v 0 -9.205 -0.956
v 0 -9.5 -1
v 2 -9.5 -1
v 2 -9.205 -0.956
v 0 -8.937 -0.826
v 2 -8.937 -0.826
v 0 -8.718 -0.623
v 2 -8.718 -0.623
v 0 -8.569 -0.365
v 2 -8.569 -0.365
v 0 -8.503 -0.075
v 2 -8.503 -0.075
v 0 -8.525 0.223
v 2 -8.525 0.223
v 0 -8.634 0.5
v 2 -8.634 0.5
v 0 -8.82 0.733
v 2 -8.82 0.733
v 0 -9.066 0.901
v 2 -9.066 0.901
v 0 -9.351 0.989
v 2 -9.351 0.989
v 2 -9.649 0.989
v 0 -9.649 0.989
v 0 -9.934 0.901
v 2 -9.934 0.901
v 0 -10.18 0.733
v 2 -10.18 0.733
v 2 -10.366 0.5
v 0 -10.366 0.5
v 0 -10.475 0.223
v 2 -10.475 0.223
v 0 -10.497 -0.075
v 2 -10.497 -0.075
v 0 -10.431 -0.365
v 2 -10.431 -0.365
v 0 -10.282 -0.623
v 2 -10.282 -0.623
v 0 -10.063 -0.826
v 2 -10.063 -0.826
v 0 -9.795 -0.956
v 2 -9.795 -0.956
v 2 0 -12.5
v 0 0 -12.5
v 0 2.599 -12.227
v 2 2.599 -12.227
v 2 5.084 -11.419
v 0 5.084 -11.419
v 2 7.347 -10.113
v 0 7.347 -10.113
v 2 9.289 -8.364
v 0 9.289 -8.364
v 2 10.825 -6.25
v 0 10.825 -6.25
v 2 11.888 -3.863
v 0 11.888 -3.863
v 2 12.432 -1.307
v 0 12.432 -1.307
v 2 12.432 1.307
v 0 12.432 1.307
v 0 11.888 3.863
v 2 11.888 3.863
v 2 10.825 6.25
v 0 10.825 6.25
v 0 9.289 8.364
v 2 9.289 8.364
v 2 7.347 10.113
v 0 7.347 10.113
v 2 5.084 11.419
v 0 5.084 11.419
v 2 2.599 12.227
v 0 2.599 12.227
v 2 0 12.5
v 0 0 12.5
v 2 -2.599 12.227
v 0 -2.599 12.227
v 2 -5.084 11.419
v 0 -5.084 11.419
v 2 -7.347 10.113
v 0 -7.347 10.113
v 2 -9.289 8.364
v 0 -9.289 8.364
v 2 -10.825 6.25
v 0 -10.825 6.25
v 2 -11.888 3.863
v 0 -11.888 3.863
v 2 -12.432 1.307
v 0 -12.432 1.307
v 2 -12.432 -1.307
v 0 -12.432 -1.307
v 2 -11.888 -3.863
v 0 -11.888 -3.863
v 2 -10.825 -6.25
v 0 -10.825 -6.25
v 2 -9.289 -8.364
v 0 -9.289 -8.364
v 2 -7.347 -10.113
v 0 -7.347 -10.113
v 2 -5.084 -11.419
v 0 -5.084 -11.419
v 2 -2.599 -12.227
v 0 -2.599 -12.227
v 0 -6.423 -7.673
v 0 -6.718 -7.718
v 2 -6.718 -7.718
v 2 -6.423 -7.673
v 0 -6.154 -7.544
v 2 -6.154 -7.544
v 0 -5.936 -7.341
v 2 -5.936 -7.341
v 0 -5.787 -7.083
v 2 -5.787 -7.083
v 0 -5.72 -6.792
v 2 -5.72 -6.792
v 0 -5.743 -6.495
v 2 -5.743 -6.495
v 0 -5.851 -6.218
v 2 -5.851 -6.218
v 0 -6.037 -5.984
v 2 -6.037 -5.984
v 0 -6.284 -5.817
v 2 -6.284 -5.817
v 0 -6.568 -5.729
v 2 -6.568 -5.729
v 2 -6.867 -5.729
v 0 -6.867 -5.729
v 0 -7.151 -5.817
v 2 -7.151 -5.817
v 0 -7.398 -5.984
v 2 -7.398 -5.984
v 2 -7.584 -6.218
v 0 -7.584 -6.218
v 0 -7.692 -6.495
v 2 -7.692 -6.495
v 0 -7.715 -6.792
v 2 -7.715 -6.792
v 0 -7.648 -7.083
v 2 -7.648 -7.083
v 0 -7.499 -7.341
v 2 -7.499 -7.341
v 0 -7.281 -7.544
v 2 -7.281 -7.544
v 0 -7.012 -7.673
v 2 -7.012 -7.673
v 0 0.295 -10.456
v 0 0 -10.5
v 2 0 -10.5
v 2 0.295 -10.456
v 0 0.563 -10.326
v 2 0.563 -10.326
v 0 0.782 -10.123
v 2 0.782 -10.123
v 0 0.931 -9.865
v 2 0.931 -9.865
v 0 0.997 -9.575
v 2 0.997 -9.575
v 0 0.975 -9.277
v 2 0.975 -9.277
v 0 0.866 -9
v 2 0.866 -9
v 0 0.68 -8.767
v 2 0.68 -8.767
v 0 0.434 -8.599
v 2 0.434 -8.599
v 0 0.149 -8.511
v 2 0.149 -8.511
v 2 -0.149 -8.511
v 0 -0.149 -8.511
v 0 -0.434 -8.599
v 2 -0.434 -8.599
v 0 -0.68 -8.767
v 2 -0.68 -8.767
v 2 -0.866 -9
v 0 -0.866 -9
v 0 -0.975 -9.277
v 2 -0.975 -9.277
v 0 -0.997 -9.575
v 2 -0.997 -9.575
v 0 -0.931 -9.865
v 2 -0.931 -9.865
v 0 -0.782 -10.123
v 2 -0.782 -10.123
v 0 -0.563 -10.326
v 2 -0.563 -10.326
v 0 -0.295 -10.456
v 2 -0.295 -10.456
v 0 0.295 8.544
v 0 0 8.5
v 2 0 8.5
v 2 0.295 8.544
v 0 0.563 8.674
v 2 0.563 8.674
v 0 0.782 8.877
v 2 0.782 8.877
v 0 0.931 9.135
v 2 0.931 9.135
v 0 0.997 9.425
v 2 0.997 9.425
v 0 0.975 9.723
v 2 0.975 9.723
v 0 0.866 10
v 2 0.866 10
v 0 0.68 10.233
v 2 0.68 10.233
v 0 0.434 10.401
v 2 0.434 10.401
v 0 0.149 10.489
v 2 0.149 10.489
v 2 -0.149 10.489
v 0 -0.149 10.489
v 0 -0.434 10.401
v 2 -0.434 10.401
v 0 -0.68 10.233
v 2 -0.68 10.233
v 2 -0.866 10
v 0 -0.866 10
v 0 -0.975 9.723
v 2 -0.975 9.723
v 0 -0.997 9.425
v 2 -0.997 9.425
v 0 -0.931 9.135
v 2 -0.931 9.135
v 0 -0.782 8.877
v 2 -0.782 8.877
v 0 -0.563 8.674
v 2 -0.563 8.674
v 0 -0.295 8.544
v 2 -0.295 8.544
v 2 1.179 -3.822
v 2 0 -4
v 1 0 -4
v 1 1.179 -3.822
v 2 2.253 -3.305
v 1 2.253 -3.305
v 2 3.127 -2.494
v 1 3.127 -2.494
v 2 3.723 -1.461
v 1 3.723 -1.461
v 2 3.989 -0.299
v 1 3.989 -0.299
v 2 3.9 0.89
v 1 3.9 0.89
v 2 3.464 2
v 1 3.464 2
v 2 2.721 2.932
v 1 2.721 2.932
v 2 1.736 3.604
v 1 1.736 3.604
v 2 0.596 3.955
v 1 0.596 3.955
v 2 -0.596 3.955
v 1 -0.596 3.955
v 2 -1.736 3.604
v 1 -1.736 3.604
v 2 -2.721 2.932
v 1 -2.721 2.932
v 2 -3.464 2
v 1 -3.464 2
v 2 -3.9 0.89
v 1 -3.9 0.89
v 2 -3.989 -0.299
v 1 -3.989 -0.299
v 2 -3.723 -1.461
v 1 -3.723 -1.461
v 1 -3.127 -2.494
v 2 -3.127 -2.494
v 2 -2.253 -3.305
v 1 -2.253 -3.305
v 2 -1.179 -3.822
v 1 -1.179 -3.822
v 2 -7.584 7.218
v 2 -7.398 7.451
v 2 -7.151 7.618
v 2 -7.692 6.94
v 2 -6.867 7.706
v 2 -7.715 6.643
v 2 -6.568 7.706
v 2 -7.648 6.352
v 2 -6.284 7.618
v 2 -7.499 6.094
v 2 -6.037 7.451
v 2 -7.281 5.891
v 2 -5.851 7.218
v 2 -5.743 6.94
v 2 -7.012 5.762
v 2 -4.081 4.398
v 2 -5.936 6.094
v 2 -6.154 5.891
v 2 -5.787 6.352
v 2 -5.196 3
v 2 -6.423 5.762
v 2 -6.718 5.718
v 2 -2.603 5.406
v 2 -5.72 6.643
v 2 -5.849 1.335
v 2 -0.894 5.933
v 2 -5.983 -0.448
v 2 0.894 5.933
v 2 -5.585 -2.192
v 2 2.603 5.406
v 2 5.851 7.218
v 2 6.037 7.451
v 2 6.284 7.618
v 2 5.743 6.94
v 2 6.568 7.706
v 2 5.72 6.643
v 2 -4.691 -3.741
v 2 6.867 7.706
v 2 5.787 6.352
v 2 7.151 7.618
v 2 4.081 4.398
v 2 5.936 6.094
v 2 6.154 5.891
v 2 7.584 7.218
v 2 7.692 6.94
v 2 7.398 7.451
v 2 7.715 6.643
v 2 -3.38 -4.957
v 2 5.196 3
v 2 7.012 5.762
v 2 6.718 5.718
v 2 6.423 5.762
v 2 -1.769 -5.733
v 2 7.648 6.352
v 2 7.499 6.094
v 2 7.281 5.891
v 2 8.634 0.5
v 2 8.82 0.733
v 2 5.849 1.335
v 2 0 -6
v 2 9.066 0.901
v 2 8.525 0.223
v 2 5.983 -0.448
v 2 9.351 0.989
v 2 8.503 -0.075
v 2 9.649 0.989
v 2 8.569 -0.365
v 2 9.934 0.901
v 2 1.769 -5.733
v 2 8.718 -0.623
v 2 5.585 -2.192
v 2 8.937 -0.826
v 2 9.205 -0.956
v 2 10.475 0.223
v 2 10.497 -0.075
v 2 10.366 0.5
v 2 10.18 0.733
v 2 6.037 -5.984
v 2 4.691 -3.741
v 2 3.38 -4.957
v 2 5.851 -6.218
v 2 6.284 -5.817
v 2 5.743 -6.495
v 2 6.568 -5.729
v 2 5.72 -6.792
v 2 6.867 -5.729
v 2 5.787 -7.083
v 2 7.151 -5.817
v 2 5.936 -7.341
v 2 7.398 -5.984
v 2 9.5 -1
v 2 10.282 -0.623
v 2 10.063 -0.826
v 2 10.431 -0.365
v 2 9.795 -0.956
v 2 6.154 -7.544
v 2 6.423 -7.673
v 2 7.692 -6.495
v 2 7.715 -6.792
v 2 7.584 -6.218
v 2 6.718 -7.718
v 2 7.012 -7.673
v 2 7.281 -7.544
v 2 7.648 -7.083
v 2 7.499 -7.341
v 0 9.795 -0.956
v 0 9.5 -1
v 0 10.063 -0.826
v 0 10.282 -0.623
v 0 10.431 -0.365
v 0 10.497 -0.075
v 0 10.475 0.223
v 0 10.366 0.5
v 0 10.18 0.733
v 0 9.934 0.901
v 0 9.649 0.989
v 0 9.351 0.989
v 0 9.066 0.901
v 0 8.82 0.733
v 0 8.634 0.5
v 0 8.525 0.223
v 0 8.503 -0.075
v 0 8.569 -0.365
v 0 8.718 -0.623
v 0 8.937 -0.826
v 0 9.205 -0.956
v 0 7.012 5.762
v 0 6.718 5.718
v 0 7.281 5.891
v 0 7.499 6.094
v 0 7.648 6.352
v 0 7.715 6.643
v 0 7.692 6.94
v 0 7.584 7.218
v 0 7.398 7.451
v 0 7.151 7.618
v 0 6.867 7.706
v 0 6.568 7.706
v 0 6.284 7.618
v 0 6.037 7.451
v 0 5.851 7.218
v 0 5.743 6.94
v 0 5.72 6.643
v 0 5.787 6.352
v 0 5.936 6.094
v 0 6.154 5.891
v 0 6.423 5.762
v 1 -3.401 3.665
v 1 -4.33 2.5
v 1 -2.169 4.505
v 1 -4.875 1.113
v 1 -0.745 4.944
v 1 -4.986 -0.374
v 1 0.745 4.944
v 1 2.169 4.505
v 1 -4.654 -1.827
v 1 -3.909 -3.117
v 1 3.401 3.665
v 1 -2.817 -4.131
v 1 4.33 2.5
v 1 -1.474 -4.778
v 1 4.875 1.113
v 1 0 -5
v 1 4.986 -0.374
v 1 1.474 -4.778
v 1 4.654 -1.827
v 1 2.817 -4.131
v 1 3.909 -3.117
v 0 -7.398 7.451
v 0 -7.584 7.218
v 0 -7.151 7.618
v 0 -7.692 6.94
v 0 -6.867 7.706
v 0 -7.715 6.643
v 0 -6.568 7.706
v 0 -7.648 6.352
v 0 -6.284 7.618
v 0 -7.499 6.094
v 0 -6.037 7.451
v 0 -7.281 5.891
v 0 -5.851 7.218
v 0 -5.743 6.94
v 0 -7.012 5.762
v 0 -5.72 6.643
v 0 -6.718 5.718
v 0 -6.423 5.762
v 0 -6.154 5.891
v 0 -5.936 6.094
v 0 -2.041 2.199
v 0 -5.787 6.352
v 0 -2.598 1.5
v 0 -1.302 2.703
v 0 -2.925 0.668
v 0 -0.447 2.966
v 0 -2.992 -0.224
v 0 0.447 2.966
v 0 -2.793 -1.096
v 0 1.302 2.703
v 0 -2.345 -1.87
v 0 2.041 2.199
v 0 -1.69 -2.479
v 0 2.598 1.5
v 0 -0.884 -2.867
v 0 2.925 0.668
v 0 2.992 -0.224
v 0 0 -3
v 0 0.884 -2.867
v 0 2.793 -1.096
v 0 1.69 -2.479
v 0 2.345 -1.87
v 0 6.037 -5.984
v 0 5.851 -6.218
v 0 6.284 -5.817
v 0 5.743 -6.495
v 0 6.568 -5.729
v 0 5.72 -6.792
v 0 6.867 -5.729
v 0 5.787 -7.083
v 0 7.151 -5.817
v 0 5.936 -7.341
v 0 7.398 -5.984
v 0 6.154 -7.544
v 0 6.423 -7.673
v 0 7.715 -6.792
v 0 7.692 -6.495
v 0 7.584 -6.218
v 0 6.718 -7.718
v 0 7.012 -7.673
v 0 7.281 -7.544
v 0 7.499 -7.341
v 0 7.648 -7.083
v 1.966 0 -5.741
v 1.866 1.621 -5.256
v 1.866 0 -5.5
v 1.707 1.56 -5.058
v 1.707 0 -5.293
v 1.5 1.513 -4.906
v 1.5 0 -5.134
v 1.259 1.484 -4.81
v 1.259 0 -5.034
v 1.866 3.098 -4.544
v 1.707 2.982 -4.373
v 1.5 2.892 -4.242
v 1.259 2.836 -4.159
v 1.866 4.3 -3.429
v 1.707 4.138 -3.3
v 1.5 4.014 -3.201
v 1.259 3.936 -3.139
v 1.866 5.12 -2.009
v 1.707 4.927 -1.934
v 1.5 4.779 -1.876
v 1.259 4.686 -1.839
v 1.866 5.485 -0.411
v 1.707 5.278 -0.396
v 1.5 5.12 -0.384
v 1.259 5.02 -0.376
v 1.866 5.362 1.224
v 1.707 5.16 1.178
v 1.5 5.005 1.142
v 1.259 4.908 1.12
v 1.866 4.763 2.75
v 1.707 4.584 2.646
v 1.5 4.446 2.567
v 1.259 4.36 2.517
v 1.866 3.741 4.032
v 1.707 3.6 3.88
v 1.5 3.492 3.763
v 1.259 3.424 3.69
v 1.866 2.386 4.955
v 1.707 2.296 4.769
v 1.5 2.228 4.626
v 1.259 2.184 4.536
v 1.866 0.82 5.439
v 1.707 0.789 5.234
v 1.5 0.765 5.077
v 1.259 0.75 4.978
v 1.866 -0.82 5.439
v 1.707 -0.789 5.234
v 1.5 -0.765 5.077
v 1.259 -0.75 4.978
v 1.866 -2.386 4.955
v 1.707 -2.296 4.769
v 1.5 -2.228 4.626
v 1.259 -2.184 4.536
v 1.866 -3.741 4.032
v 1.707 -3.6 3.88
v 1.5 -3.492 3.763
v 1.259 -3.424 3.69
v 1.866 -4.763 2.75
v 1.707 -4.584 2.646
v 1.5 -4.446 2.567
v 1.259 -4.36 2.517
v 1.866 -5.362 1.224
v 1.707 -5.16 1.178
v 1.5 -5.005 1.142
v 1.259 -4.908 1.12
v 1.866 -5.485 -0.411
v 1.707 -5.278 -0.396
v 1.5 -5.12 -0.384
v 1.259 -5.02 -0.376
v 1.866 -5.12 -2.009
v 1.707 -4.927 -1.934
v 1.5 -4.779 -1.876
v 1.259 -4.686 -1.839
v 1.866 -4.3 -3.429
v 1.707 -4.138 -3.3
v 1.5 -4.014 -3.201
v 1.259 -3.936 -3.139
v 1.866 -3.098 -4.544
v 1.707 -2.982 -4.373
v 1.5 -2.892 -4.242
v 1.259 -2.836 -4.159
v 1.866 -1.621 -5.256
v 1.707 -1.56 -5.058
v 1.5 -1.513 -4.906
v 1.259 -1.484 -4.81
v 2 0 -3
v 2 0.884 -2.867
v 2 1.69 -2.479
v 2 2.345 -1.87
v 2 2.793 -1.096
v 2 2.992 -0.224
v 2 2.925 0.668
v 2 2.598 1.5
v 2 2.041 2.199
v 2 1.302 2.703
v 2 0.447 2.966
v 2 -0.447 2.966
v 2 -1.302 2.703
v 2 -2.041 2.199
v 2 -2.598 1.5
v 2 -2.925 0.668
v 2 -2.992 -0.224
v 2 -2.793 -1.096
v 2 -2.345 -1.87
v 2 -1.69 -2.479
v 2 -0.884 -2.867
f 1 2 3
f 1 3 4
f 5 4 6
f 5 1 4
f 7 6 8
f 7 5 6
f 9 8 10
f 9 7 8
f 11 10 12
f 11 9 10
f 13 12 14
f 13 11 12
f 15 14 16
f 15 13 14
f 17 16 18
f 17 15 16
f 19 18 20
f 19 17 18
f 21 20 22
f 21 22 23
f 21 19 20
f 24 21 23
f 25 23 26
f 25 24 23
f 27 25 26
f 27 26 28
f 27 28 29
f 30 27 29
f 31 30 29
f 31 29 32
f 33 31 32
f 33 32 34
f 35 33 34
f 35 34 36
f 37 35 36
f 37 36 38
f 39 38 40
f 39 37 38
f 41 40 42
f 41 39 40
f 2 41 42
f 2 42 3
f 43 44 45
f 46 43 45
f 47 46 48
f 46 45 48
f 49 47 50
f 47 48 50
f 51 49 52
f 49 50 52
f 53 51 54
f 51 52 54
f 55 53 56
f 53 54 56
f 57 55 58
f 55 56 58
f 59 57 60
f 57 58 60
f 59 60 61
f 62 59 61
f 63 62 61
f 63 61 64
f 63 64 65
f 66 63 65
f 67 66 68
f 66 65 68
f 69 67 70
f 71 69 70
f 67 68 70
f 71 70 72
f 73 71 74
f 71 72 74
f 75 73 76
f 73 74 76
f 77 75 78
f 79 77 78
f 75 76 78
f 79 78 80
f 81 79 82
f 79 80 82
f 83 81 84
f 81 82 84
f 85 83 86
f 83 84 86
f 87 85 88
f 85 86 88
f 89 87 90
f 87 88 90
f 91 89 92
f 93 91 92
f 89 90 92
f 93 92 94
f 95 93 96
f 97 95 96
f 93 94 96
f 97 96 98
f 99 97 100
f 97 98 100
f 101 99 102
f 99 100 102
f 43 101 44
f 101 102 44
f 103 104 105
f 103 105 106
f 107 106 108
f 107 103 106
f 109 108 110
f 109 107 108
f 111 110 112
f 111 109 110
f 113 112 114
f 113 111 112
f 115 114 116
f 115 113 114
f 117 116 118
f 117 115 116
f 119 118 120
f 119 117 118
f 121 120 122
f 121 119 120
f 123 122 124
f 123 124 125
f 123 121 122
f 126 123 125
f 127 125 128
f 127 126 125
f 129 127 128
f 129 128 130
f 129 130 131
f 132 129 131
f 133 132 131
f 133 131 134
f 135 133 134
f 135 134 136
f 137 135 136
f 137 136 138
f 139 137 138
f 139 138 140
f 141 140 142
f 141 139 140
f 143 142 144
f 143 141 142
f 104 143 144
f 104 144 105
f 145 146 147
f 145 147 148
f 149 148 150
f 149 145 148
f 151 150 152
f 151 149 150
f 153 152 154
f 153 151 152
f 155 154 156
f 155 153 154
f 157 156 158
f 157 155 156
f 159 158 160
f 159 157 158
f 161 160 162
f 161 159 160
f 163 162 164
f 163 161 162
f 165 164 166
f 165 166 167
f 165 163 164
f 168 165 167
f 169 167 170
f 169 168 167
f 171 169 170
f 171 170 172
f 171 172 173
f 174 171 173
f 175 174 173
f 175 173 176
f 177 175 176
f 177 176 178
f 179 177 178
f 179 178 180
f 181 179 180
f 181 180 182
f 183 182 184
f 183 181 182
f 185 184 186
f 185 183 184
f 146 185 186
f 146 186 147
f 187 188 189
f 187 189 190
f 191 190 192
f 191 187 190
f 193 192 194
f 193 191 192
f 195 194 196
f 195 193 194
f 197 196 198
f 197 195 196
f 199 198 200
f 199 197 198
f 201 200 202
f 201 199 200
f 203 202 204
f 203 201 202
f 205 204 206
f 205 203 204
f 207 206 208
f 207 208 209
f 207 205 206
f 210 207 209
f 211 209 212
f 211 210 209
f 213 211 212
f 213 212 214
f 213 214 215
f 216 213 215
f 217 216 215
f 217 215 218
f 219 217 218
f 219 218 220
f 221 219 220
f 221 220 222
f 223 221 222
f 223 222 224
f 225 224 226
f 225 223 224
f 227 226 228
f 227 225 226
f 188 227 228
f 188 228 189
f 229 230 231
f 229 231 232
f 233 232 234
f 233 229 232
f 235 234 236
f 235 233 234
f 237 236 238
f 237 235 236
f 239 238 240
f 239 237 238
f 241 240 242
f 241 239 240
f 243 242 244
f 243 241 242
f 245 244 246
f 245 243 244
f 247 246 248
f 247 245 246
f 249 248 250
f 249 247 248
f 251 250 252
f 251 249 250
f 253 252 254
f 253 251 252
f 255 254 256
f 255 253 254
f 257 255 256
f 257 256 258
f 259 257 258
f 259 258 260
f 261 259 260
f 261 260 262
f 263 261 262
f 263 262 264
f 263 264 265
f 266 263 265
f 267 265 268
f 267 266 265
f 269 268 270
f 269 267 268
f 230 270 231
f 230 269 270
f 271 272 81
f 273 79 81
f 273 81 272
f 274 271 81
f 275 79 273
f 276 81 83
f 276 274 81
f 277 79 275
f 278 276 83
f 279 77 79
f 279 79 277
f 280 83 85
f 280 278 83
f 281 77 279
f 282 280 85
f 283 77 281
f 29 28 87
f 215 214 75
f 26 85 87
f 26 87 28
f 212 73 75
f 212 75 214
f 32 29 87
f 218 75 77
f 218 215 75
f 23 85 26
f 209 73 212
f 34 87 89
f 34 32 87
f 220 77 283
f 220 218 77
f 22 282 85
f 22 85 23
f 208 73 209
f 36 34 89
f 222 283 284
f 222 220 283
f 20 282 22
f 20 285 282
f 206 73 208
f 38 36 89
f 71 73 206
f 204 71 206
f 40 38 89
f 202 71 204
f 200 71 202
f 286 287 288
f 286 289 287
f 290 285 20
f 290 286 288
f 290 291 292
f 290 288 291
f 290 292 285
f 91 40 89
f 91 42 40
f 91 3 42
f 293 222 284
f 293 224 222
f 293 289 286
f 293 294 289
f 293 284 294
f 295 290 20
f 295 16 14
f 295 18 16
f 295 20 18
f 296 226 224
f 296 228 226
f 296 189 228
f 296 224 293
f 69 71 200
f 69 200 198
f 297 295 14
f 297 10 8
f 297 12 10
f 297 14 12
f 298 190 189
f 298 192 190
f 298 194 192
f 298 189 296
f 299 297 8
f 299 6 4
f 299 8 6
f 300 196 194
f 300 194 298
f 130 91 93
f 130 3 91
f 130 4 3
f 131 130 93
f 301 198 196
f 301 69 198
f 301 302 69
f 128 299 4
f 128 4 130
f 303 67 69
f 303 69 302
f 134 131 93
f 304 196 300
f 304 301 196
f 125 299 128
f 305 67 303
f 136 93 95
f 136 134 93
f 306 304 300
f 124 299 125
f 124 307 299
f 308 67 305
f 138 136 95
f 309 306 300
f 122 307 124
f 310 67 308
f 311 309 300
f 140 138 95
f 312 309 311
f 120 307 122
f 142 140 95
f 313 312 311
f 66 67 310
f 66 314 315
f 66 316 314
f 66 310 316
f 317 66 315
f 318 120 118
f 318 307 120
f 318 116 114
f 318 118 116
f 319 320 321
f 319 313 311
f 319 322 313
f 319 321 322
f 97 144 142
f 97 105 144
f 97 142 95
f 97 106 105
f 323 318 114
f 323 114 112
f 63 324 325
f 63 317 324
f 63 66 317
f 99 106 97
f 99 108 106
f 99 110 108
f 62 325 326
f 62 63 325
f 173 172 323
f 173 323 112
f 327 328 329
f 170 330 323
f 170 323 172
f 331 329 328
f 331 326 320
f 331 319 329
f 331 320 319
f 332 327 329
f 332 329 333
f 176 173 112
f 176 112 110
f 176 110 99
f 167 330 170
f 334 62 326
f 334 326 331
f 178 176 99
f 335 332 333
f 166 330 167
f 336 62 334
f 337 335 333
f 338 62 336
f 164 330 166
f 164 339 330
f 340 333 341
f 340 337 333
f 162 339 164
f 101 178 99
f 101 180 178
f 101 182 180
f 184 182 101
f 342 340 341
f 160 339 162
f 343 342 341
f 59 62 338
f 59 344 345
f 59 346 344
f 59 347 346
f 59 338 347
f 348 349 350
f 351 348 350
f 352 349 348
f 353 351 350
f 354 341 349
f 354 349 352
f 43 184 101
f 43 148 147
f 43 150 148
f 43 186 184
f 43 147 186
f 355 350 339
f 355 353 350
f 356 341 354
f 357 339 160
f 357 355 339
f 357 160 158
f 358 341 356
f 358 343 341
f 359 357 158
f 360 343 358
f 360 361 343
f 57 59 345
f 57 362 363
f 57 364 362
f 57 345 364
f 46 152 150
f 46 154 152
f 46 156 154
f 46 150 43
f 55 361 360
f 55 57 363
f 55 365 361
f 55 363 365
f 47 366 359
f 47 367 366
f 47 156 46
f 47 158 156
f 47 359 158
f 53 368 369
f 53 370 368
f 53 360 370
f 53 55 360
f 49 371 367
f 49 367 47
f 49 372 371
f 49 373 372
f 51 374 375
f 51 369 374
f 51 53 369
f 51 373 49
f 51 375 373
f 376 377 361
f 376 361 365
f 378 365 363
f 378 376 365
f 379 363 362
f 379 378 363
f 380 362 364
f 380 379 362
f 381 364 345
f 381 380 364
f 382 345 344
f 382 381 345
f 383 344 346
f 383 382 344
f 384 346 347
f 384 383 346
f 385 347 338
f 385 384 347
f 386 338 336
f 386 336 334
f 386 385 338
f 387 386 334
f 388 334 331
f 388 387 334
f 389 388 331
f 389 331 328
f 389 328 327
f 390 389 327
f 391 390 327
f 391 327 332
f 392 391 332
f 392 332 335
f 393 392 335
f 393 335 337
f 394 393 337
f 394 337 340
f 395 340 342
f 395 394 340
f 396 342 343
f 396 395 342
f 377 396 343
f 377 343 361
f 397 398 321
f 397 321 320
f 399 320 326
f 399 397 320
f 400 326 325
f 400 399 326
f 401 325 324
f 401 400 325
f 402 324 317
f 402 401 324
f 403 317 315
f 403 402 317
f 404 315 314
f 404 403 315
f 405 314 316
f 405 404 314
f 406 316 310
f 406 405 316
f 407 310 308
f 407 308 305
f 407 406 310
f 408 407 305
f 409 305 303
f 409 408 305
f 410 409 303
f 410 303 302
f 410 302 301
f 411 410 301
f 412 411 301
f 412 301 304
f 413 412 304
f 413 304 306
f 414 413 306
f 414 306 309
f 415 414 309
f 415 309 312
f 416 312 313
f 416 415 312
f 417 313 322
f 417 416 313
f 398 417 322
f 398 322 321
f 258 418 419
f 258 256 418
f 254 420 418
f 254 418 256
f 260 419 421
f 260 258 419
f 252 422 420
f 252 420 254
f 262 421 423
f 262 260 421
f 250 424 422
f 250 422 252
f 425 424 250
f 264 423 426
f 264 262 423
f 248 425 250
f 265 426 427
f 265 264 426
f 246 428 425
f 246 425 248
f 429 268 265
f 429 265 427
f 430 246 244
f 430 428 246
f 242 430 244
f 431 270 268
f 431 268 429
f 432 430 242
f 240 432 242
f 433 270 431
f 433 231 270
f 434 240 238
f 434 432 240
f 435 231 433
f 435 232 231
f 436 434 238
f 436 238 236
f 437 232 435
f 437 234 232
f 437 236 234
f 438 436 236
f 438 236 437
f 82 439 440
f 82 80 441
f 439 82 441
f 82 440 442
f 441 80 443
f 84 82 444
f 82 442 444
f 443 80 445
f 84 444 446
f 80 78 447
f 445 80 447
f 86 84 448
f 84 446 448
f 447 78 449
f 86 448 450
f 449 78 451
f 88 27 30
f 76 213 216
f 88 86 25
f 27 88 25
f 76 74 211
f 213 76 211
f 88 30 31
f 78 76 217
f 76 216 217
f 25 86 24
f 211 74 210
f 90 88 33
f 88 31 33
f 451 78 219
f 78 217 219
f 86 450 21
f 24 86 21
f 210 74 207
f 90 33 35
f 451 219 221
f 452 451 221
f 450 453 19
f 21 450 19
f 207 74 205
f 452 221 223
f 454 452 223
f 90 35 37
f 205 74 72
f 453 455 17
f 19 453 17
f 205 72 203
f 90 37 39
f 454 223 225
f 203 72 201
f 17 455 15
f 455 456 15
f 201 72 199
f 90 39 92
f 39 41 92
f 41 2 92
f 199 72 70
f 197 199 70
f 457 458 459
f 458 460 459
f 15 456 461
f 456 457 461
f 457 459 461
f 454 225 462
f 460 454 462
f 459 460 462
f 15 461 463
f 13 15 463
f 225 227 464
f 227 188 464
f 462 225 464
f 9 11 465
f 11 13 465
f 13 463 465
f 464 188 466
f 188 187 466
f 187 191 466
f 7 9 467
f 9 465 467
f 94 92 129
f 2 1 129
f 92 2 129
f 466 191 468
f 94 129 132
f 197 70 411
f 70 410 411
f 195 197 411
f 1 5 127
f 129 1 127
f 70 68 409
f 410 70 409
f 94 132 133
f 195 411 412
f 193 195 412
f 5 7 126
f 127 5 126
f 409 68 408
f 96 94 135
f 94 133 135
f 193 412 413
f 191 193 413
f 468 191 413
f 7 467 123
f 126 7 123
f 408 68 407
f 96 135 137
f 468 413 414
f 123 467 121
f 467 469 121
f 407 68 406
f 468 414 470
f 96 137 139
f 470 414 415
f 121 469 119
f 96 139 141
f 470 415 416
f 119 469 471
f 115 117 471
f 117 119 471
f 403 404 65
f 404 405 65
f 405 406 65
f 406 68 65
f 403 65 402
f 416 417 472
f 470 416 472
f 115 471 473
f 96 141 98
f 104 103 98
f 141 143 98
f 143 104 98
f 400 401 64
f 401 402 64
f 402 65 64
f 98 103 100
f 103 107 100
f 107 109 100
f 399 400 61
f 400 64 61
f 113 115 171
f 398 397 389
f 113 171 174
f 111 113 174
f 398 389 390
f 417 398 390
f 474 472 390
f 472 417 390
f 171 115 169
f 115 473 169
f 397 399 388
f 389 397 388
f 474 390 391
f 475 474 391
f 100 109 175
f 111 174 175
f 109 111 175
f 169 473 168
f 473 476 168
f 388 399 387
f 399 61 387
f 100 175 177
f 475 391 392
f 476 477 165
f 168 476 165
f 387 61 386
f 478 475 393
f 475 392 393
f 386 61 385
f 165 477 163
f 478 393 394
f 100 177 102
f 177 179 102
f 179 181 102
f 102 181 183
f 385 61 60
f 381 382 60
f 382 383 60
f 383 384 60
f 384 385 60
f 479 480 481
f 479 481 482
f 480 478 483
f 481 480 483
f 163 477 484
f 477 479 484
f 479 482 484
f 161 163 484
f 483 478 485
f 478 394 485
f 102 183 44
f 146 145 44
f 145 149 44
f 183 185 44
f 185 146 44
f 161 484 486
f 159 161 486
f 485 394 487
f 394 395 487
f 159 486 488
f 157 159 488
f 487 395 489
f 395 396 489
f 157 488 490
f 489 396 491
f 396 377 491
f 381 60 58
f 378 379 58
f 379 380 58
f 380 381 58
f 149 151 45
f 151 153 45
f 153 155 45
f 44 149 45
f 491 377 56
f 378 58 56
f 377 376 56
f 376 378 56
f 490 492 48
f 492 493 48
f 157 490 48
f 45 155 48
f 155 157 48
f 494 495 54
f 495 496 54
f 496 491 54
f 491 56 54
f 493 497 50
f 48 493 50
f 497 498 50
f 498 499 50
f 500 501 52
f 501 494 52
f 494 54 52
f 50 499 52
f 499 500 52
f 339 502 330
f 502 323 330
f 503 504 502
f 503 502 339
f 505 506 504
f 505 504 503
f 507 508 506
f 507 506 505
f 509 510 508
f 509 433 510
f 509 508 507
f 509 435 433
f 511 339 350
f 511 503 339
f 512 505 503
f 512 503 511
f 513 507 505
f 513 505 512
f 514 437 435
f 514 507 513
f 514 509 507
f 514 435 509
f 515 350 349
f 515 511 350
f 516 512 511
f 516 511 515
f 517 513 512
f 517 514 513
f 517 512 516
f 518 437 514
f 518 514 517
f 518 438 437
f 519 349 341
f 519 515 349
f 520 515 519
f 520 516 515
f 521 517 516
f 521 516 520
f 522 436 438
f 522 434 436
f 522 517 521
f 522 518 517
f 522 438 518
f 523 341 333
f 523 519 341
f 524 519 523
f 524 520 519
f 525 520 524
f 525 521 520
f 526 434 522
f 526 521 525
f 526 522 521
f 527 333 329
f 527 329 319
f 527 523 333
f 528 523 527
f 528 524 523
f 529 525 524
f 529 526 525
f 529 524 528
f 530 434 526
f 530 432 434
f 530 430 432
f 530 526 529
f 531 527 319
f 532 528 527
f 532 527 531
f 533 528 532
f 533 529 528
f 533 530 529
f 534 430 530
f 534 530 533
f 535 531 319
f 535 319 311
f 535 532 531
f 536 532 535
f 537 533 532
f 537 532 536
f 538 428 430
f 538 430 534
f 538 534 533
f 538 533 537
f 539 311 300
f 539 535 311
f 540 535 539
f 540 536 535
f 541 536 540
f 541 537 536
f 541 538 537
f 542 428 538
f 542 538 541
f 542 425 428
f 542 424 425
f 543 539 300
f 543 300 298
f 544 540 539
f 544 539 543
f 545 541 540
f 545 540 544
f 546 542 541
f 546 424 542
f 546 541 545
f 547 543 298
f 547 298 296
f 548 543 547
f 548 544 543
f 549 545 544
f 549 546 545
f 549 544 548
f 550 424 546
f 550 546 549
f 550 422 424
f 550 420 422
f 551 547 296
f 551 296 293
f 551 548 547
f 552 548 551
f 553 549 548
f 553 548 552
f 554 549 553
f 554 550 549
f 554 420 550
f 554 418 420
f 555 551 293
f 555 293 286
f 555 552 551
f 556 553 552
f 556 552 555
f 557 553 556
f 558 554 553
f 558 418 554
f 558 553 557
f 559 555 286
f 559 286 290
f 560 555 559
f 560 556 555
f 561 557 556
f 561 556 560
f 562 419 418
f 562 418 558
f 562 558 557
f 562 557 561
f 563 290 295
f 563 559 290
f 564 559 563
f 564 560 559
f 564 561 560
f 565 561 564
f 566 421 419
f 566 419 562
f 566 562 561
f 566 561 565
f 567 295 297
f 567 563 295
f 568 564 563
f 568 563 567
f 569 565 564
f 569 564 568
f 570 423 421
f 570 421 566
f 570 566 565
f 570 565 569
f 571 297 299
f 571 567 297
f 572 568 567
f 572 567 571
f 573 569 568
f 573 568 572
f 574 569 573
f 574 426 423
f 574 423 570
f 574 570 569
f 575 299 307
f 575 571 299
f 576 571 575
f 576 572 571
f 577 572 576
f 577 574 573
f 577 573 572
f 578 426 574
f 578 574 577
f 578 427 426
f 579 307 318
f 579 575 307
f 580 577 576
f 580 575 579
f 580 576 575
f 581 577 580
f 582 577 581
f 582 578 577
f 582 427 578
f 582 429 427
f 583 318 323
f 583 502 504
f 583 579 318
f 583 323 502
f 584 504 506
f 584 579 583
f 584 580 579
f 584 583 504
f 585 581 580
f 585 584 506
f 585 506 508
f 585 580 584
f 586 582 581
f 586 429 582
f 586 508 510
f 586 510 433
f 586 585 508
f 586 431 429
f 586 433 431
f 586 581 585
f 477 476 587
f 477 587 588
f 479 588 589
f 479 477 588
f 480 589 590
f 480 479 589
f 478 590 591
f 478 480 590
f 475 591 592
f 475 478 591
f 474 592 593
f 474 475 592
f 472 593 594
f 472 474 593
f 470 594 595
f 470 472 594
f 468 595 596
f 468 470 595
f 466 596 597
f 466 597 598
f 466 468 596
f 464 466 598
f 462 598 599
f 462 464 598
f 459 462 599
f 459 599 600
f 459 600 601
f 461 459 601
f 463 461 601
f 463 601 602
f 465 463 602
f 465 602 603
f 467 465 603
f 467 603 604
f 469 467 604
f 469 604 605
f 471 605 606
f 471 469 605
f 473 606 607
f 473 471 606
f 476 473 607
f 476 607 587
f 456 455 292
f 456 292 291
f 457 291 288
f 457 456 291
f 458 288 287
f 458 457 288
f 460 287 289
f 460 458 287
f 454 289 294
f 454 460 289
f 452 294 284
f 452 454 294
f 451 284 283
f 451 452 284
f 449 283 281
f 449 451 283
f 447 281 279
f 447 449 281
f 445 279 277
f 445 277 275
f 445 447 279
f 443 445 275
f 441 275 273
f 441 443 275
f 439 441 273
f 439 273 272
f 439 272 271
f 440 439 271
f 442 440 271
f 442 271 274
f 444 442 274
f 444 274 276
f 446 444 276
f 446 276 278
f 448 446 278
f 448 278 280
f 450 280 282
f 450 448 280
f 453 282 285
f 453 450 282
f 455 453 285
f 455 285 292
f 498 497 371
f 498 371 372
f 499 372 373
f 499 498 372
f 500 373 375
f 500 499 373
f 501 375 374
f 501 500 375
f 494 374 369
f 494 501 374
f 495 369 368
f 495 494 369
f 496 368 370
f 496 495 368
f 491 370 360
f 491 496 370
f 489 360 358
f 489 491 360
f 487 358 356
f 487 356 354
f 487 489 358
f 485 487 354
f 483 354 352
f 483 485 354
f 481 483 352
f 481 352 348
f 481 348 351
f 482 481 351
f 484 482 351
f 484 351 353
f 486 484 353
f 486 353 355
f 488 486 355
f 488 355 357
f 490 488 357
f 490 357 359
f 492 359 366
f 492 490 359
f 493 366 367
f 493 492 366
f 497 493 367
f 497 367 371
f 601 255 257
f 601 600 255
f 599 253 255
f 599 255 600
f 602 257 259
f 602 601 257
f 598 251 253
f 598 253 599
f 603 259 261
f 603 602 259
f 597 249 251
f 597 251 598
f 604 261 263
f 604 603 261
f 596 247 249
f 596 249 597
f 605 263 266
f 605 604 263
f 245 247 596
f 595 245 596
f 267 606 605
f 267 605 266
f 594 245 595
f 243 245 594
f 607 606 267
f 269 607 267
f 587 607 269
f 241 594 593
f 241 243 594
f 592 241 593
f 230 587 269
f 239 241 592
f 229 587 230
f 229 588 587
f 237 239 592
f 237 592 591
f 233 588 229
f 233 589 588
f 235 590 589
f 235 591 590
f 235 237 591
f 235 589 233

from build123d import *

# Parameters (mm, degrees)
SKETCH1_R           = 12.5
SKETCH1_R_2         = 3
SKETCH1_R_3         = 1
BOSS_EXTRUDE1_DEPTH = 2
SKETCH2_R           = 5
SKETCH2_R_2         = 4
CUT_EXTRUDE1_DEPTH  = 1
FILLET1_R           = 1


with BuildPart() as part:
    # Sketch1 → Boss-Extrude1 (new body)
    with BuildSketch(Plane(origin=(0, 0, 0), x_dir=(0, 0, -1), z_dir=(1, 0, 0))):
        Circle(SKETCH1_R)
        Circle(SKETCH1_R_2, mode=Mode.SUBTRACT)
        with Locations((9.5, 0)):
            Circle(SKETCH1_R_3, mode=Mode.SUBTRACT)
        with Locations((6.717514421, -6.717514421)):
            Circle(SKETCH1_R_3, mode=Mode.SUBTRACT)
        with Locations((0, -9.5)):
            Circle(SKETCH1_R_3, mode=Mode.SUBTRACT)
        with Locations((-6.717514421, -6.717514421)):
            Circle(SKETCH1_R_3, mode=Mode.SUBTRACT)
        with Locations((-9.5, 0)):
            Circle(SKETCH1_R_3, mode=Mode.SUBTRACT)
        with Locations((-6.717514421, 6.717514421)):
            Circle(SKETCH1_R_3, mode=Mode.SUBTRACT)
        with Locations((0, 9.5)):
            Circle(SKETCH1_R_3, mode=Mode.SUBTRACT)
        with Locations((6.717514421, 6.717514421)):
            Circle(SKETCH1_R_3, mode=Mode.SUBTRACT)
    extrude(amount=BOSS_EXTRUDE1_DEPTH)

    # Sketch2 → Cut-Extrude1 (cut)
    with BuildSketch(Plane(origin=(2, 0, 0), x_dir=(0, 0, -1), z_dir=(1, 0, 0))):
        Circle(SKETCH2_R)
        Circle(SKETCH2_R_2, mode=Mode.SUBTRACT)
    extrude(amount=-CUT_EXTRUDE1_DEPTH, mode=Mode.SUBTRACT)

    # Fillet1
    fillet1_edges = [part.edges().sort_by_distance(p)[0] for p in [
        (2, 0, 5),
    ]]
    fillet(fillet1_edges, radius=FILLET1_R - 0.0001)  # a hair under: the kernel refuses the full size


solid = part.part
